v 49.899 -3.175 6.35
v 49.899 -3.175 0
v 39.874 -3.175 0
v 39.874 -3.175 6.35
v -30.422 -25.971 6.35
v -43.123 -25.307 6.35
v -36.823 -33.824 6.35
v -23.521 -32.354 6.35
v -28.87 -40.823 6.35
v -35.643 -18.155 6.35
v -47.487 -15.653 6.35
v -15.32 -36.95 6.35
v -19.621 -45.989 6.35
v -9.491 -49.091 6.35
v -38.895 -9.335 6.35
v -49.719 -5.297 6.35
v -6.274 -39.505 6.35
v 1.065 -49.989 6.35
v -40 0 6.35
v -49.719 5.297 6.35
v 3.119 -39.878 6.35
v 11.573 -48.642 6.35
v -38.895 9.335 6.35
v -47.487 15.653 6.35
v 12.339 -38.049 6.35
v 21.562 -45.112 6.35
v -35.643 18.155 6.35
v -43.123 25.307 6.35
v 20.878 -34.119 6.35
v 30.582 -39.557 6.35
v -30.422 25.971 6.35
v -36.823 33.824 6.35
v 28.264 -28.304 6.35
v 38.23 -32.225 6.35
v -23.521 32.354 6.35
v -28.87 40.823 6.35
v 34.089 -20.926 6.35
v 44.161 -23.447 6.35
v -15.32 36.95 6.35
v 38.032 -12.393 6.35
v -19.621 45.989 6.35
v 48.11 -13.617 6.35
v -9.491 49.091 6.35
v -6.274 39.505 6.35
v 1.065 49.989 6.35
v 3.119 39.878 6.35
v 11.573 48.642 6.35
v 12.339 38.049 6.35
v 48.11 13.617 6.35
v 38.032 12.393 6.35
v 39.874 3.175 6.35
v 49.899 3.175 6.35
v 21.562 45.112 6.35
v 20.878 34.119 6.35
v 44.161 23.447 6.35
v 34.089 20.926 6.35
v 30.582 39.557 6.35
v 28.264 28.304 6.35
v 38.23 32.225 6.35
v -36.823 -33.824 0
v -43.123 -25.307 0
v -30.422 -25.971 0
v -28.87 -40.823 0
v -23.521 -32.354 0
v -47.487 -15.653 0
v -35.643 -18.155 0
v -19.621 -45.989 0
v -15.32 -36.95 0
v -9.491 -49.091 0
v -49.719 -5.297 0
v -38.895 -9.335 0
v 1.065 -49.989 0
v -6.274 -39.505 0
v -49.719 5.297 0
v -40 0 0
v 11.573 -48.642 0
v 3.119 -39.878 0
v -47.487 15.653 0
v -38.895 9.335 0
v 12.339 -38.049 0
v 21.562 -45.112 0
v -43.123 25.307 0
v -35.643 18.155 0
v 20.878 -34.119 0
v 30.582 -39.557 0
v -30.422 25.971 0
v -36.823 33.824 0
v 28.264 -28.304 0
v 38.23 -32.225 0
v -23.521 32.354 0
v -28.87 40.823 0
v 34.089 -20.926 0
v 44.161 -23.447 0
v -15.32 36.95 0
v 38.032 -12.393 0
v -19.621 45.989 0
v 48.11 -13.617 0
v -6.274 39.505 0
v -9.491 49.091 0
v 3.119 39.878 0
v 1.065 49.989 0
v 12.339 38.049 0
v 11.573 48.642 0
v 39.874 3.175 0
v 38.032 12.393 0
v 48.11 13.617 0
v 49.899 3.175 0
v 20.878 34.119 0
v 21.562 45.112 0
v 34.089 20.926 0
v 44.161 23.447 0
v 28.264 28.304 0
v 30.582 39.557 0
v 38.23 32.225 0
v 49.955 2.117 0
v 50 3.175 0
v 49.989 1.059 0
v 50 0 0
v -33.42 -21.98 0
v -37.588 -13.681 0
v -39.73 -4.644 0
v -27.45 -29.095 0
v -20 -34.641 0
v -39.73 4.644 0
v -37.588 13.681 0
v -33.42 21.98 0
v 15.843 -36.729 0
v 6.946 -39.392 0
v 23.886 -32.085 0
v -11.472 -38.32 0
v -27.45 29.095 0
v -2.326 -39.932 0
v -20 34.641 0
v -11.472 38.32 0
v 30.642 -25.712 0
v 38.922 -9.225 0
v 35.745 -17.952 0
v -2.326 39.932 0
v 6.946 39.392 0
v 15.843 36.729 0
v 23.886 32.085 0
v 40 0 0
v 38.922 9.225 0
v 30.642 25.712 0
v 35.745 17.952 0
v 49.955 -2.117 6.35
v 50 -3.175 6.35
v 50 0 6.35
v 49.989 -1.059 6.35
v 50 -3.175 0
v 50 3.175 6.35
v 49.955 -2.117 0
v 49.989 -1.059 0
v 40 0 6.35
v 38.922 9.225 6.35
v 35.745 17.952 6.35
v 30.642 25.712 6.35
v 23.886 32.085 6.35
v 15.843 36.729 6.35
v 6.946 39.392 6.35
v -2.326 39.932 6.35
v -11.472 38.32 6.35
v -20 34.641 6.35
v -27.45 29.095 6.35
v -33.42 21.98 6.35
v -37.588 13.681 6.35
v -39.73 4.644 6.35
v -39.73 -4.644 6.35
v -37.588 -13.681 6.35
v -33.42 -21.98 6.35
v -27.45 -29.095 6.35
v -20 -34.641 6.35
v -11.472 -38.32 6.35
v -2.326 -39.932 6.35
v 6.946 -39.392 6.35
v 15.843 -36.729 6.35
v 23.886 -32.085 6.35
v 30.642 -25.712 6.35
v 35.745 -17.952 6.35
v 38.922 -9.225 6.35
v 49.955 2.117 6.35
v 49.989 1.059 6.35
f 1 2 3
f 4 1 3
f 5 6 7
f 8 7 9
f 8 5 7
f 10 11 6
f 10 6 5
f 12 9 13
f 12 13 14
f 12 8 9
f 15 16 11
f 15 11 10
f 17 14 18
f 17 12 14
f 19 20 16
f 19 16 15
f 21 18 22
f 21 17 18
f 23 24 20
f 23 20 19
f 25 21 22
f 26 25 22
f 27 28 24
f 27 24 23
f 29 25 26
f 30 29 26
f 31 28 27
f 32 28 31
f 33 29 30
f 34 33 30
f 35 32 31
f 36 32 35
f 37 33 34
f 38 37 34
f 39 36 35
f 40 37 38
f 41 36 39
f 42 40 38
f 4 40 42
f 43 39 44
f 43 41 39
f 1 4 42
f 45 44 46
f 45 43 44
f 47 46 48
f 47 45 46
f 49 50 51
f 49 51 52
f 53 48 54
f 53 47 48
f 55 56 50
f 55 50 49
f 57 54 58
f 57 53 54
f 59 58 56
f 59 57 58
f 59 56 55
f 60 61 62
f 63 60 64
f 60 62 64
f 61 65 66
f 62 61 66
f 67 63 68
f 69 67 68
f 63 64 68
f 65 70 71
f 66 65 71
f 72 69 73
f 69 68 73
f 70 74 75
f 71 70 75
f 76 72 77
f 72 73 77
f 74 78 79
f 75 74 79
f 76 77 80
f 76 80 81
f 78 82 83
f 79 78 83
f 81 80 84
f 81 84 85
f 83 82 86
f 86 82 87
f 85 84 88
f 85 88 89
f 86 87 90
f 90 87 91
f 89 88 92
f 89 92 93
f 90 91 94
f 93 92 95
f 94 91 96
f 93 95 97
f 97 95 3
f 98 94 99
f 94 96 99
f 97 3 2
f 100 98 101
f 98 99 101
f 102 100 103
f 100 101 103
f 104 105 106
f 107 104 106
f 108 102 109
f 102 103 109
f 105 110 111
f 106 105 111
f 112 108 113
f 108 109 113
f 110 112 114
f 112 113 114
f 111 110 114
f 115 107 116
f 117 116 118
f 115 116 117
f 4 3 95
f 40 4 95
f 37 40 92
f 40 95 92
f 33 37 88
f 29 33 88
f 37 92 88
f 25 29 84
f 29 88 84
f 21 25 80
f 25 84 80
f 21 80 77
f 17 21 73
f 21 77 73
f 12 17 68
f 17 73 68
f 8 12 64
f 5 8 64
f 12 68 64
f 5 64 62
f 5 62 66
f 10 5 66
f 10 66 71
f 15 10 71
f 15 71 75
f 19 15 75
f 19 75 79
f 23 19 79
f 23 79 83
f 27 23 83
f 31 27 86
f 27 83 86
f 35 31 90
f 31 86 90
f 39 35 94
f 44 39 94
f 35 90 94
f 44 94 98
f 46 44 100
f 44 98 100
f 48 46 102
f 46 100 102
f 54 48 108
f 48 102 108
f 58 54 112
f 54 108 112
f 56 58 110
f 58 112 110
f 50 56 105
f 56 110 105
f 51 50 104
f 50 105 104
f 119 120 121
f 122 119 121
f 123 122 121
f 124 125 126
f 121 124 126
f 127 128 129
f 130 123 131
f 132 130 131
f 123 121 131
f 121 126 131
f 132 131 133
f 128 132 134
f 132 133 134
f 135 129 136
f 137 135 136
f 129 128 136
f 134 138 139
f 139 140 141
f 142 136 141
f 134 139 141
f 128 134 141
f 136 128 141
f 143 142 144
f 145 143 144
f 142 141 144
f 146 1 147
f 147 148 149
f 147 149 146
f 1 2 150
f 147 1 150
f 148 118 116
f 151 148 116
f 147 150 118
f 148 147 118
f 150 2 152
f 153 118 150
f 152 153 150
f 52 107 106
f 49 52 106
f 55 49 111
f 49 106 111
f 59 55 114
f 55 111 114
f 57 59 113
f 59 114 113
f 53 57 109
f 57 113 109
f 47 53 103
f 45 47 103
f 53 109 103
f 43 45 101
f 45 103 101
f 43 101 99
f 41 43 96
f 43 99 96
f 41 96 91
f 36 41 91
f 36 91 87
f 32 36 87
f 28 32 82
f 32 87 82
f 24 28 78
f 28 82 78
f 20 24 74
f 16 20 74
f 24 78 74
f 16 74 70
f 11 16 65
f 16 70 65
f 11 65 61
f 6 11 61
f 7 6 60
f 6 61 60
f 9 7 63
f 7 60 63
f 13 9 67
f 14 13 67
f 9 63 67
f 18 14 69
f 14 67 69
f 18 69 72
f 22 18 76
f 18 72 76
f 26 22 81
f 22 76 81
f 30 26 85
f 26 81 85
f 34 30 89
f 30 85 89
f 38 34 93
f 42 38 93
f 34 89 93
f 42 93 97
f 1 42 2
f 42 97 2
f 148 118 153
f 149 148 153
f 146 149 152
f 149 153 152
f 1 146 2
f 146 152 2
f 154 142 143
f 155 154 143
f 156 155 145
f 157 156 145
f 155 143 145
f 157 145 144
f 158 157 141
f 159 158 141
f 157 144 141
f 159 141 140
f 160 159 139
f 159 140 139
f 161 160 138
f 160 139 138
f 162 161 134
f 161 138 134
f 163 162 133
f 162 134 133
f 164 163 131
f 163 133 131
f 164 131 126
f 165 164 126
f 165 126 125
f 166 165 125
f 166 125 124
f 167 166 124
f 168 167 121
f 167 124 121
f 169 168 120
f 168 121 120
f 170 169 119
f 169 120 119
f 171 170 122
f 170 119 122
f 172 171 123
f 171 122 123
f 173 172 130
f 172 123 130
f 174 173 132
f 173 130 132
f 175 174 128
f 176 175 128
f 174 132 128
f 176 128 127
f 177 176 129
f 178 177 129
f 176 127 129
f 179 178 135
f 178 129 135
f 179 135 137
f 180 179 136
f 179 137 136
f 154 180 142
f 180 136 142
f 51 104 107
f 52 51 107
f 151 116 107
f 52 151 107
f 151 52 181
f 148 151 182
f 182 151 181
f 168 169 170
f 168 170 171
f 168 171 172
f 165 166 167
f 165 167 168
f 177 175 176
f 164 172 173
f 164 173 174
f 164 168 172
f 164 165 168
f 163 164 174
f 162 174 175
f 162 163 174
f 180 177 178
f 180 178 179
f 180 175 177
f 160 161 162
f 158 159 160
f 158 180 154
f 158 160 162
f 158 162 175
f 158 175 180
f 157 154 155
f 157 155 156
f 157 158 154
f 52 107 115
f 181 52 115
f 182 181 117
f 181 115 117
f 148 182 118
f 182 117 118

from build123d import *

# Parameters (mm, degrees)
F0_R     = 40
F1_DEPTH = 6.35
F3_DEPTH = 6.35


with BuildPart() as f1:
    # F0 (on Top) → F1 (new body)
    with BuildSketch(Plane.XY):
        Circle(F0_R)
    extrude(amount=F1_DEPTH)


with BuildPart() as f3:
    # F2 (on Top) → F3 (new body, through all)
    with BuildSketch(Plane.XY):
        with BuildLine():
            Line((50, 3.175), (49.8990919256, 3.175))
            ThreePointArc((49.8990919256, 3.175), (49.9747666142, 1.5883015645), (50, 0))
            Line((50, 0), (50, 3.175))
        make_face()
    extrude(amount=F3_DEPTH)


with BuildPart() as f3b:
    # F2 (on Top) → F3, piece 2 (new body, through all)
    with BuildSketch(Plane.XY):
        with BuildLine():
            ThreePointArc((50, 0), (49.9747666142, -1.5883015645), (49.8990919256, -3.175))
            Line((49.8990919256, -3.175), (50, -3.175))
            Line((50, -3.175), (50, 0))
        make_face()
    extrude(amount=F3_DEPTH)


with BuildPart() as f3c:
    # F2 (on Top) → F3, piece 3 (new body, through all)
    with BuildSketch(Plane.XY):
        with BuildLine():
            ThreePointArc((39.8737930852, -3.175), (-40, 0), (39.8737930852, 3.175))
            Line((39.8737930852, 3.175), (49.8990919256, 3.175))
            ThreePointArc((49.8990919256, 3.175), (-50, 0), (49.8990919256, -3.175))
            Line((49.8990919256, -3.175), (39.8737930852, -3.175))
        make_face()
    extrude(amount=F3_DEPTH)


solid = Compound([f1.part, f3.part, f3b.part, f3c.part])
